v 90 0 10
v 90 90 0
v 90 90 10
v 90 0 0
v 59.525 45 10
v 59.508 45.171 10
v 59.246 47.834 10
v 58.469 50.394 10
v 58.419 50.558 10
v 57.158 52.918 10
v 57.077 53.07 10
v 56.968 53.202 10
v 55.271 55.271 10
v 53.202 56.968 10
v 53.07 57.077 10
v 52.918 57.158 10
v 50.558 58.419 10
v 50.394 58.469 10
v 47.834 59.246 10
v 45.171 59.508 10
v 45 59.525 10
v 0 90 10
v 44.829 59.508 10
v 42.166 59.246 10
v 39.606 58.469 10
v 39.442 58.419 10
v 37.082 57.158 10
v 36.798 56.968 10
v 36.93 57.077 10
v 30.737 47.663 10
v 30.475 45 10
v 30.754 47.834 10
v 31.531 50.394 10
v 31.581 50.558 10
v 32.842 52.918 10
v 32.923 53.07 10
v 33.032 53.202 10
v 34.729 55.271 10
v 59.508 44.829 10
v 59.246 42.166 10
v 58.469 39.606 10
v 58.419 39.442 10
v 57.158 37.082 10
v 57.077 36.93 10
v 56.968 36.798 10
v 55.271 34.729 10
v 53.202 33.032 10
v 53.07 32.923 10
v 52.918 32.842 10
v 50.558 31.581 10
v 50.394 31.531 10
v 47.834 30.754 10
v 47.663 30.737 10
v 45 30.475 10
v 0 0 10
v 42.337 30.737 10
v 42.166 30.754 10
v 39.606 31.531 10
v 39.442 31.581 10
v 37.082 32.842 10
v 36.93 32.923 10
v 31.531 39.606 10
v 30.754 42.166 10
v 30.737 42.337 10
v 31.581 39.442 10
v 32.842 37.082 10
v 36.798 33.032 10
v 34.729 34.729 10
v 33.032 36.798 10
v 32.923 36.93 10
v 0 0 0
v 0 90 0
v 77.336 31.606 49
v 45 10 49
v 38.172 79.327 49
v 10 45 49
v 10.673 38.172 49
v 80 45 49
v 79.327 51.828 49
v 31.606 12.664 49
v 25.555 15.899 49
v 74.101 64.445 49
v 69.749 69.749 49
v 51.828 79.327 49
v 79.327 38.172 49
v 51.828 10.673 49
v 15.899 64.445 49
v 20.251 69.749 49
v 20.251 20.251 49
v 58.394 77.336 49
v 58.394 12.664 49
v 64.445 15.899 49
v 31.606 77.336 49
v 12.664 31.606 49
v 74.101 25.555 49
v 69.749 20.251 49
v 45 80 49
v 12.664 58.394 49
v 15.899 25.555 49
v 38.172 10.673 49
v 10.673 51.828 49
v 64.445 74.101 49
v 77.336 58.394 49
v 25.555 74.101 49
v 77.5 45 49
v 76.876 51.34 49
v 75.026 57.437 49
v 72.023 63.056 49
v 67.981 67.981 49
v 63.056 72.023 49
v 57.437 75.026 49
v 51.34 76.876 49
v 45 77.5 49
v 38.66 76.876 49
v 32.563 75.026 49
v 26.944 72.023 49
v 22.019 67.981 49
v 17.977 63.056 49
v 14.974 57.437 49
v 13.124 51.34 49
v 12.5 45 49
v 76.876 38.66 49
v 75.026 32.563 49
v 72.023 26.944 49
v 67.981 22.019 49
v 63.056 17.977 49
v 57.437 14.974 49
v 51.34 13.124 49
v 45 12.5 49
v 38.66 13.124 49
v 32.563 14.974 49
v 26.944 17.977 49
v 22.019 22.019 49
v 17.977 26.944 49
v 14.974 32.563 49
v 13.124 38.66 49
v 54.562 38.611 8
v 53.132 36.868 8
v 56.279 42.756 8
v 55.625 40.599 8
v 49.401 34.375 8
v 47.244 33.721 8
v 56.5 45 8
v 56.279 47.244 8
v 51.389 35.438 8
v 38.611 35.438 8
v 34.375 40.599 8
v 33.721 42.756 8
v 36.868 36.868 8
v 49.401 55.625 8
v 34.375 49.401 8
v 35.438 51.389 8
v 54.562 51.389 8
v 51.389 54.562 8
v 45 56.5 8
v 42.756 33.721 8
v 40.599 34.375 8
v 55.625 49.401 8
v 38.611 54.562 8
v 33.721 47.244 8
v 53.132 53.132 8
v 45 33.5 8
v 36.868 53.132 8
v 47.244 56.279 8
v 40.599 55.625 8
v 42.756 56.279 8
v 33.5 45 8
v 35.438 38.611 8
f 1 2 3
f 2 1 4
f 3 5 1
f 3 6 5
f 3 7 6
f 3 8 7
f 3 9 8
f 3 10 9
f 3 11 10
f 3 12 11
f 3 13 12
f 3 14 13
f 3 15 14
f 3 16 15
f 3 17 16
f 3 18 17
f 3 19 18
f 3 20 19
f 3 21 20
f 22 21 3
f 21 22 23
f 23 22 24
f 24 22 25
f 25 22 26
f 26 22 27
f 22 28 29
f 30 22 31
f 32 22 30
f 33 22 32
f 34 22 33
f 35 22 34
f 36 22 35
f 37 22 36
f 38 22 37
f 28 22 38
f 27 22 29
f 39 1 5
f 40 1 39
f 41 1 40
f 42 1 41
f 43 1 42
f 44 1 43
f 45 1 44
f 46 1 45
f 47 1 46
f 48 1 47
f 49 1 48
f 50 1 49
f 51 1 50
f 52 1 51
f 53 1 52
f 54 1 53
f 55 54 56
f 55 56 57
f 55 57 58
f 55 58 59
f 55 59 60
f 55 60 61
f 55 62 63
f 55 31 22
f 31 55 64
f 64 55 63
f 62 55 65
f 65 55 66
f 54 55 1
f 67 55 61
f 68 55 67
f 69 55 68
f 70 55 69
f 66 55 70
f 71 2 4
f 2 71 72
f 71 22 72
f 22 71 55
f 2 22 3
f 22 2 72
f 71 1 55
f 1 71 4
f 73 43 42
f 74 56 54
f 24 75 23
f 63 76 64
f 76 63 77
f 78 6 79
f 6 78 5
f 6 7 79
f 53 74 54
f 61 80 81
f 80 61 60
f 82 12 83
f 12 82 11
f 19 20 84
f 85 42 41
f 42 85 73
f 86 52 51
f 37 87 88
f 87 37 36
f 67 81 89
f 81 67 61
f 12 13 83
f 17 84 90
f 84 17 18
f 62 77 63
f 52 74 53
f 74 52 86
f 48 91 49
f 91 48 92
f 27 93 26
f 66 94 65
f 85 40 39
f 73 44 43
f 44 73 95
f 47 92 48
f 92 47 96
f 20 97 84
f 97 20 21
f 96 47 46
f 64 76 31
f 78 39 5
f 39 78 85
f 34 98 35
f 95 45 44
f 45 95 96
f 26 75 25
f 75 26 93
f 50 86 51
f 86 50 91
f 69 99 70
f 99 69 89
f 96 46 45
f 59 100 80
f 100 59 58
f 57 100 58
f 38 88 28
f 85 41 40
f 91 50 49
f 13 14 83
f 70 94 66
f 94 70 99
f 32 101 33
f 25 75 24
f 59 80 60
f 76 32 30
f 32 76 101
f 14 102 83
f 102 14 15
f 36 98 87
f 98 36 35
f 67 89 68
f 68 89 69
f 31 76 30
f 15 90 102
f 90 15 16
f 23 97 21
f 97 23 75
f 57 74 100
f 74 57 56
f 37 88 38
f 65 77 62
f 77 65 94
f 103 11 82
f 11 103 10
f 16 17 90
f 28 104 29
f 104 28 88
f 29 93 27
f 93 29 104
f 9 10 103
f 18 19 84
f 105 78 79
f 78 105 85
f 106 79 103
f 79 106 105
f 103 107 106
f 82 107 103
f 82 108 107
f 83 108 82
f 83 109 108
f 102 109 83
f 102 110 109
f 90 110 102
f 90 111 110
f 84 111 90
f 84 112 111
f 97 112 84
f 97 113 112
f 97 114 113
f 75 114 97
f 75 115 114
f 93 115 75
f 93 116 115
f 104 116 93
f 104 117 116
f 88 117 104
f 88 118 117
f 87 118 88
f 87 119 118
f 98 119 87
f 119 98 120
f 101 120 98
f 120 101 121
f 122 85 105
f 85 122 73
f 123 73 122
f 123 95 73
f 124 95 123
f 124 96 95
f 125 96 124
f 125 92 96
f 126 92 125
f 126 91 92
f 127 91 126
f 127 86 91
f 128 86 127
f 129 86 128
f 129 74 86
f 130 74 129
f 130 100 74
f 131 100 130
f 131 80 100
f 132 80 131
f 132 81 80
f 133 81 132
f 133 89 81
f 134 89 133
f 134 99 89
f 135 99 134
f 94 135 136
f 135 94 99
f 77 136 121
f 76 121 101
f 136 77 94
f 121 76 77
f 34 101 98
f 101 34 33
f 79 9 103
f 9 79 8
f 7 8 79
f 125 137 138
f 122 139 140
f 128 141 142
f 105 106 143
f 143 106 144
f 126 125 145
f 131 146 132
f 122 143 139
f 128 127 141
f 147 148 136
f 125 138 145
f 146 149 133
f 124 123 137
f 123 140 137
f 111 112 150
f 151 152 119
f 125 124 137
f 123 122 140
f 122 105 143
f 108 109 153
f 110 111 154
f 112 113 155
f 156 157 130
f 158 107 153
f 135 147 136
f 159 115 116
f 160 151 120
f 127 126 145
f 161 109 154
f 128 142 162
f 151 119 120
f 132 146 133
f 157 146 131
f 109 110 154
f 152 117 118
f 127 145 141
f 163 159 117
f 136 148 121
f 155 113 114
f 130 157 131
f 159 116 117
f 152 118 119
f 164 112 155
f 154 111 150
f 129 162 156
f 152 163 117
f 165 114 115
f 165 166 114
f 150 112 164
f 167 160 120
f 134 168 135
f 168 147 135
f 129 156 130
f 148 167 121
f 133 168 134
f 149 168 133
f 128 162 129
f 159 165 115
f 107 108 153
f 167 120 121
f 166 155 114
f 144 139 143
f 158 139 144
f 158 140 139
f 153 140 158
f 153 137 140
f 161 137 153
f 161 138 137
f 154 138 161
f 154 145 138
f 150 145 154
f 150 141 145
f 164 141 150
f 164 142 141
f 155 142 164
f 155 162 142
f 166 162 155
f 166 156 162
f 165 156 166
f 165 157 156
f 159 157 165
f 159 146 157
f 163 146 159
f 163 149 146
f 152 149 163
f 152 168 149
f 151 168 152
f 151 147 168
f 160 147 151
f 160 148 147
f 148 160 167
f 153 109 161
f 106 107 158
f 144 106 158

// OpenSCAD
$fn = 32;

// ----------------------------------------------------------------------
// Hopper: funnel with square flange
// ----------------------------------------------------------------------

// --- parameters (mm) ---
fl = 90;                  // flange side, X and Y
fl_t = 10;                // flange thickness
cone_h = 40;              // cone height above the flange
top_d = 70;               // cone mouth diameter
bot_d = 28;               // cone spout diameter
wall = 2.5;               // cone wall thickness

bore_d = bot_d - 2 * wall;  // spout bore diameter
total_h = fl_t + cone_h - 1;  // overall height

difference() {
  union() {
    cube([fl, fl, fl_t]);
    translate([fl / 2, fl / 2, fl_t - 1])
      cylinder(h = cone_h, d1 = bot_d, d2 = top_d);
  }
  translate([fl / 2, fl / 2, fl_t - 2])
    cylinder(h = cone_h + 1, d1 = bore_d, d2 = top_d - 2 * wall);
}
